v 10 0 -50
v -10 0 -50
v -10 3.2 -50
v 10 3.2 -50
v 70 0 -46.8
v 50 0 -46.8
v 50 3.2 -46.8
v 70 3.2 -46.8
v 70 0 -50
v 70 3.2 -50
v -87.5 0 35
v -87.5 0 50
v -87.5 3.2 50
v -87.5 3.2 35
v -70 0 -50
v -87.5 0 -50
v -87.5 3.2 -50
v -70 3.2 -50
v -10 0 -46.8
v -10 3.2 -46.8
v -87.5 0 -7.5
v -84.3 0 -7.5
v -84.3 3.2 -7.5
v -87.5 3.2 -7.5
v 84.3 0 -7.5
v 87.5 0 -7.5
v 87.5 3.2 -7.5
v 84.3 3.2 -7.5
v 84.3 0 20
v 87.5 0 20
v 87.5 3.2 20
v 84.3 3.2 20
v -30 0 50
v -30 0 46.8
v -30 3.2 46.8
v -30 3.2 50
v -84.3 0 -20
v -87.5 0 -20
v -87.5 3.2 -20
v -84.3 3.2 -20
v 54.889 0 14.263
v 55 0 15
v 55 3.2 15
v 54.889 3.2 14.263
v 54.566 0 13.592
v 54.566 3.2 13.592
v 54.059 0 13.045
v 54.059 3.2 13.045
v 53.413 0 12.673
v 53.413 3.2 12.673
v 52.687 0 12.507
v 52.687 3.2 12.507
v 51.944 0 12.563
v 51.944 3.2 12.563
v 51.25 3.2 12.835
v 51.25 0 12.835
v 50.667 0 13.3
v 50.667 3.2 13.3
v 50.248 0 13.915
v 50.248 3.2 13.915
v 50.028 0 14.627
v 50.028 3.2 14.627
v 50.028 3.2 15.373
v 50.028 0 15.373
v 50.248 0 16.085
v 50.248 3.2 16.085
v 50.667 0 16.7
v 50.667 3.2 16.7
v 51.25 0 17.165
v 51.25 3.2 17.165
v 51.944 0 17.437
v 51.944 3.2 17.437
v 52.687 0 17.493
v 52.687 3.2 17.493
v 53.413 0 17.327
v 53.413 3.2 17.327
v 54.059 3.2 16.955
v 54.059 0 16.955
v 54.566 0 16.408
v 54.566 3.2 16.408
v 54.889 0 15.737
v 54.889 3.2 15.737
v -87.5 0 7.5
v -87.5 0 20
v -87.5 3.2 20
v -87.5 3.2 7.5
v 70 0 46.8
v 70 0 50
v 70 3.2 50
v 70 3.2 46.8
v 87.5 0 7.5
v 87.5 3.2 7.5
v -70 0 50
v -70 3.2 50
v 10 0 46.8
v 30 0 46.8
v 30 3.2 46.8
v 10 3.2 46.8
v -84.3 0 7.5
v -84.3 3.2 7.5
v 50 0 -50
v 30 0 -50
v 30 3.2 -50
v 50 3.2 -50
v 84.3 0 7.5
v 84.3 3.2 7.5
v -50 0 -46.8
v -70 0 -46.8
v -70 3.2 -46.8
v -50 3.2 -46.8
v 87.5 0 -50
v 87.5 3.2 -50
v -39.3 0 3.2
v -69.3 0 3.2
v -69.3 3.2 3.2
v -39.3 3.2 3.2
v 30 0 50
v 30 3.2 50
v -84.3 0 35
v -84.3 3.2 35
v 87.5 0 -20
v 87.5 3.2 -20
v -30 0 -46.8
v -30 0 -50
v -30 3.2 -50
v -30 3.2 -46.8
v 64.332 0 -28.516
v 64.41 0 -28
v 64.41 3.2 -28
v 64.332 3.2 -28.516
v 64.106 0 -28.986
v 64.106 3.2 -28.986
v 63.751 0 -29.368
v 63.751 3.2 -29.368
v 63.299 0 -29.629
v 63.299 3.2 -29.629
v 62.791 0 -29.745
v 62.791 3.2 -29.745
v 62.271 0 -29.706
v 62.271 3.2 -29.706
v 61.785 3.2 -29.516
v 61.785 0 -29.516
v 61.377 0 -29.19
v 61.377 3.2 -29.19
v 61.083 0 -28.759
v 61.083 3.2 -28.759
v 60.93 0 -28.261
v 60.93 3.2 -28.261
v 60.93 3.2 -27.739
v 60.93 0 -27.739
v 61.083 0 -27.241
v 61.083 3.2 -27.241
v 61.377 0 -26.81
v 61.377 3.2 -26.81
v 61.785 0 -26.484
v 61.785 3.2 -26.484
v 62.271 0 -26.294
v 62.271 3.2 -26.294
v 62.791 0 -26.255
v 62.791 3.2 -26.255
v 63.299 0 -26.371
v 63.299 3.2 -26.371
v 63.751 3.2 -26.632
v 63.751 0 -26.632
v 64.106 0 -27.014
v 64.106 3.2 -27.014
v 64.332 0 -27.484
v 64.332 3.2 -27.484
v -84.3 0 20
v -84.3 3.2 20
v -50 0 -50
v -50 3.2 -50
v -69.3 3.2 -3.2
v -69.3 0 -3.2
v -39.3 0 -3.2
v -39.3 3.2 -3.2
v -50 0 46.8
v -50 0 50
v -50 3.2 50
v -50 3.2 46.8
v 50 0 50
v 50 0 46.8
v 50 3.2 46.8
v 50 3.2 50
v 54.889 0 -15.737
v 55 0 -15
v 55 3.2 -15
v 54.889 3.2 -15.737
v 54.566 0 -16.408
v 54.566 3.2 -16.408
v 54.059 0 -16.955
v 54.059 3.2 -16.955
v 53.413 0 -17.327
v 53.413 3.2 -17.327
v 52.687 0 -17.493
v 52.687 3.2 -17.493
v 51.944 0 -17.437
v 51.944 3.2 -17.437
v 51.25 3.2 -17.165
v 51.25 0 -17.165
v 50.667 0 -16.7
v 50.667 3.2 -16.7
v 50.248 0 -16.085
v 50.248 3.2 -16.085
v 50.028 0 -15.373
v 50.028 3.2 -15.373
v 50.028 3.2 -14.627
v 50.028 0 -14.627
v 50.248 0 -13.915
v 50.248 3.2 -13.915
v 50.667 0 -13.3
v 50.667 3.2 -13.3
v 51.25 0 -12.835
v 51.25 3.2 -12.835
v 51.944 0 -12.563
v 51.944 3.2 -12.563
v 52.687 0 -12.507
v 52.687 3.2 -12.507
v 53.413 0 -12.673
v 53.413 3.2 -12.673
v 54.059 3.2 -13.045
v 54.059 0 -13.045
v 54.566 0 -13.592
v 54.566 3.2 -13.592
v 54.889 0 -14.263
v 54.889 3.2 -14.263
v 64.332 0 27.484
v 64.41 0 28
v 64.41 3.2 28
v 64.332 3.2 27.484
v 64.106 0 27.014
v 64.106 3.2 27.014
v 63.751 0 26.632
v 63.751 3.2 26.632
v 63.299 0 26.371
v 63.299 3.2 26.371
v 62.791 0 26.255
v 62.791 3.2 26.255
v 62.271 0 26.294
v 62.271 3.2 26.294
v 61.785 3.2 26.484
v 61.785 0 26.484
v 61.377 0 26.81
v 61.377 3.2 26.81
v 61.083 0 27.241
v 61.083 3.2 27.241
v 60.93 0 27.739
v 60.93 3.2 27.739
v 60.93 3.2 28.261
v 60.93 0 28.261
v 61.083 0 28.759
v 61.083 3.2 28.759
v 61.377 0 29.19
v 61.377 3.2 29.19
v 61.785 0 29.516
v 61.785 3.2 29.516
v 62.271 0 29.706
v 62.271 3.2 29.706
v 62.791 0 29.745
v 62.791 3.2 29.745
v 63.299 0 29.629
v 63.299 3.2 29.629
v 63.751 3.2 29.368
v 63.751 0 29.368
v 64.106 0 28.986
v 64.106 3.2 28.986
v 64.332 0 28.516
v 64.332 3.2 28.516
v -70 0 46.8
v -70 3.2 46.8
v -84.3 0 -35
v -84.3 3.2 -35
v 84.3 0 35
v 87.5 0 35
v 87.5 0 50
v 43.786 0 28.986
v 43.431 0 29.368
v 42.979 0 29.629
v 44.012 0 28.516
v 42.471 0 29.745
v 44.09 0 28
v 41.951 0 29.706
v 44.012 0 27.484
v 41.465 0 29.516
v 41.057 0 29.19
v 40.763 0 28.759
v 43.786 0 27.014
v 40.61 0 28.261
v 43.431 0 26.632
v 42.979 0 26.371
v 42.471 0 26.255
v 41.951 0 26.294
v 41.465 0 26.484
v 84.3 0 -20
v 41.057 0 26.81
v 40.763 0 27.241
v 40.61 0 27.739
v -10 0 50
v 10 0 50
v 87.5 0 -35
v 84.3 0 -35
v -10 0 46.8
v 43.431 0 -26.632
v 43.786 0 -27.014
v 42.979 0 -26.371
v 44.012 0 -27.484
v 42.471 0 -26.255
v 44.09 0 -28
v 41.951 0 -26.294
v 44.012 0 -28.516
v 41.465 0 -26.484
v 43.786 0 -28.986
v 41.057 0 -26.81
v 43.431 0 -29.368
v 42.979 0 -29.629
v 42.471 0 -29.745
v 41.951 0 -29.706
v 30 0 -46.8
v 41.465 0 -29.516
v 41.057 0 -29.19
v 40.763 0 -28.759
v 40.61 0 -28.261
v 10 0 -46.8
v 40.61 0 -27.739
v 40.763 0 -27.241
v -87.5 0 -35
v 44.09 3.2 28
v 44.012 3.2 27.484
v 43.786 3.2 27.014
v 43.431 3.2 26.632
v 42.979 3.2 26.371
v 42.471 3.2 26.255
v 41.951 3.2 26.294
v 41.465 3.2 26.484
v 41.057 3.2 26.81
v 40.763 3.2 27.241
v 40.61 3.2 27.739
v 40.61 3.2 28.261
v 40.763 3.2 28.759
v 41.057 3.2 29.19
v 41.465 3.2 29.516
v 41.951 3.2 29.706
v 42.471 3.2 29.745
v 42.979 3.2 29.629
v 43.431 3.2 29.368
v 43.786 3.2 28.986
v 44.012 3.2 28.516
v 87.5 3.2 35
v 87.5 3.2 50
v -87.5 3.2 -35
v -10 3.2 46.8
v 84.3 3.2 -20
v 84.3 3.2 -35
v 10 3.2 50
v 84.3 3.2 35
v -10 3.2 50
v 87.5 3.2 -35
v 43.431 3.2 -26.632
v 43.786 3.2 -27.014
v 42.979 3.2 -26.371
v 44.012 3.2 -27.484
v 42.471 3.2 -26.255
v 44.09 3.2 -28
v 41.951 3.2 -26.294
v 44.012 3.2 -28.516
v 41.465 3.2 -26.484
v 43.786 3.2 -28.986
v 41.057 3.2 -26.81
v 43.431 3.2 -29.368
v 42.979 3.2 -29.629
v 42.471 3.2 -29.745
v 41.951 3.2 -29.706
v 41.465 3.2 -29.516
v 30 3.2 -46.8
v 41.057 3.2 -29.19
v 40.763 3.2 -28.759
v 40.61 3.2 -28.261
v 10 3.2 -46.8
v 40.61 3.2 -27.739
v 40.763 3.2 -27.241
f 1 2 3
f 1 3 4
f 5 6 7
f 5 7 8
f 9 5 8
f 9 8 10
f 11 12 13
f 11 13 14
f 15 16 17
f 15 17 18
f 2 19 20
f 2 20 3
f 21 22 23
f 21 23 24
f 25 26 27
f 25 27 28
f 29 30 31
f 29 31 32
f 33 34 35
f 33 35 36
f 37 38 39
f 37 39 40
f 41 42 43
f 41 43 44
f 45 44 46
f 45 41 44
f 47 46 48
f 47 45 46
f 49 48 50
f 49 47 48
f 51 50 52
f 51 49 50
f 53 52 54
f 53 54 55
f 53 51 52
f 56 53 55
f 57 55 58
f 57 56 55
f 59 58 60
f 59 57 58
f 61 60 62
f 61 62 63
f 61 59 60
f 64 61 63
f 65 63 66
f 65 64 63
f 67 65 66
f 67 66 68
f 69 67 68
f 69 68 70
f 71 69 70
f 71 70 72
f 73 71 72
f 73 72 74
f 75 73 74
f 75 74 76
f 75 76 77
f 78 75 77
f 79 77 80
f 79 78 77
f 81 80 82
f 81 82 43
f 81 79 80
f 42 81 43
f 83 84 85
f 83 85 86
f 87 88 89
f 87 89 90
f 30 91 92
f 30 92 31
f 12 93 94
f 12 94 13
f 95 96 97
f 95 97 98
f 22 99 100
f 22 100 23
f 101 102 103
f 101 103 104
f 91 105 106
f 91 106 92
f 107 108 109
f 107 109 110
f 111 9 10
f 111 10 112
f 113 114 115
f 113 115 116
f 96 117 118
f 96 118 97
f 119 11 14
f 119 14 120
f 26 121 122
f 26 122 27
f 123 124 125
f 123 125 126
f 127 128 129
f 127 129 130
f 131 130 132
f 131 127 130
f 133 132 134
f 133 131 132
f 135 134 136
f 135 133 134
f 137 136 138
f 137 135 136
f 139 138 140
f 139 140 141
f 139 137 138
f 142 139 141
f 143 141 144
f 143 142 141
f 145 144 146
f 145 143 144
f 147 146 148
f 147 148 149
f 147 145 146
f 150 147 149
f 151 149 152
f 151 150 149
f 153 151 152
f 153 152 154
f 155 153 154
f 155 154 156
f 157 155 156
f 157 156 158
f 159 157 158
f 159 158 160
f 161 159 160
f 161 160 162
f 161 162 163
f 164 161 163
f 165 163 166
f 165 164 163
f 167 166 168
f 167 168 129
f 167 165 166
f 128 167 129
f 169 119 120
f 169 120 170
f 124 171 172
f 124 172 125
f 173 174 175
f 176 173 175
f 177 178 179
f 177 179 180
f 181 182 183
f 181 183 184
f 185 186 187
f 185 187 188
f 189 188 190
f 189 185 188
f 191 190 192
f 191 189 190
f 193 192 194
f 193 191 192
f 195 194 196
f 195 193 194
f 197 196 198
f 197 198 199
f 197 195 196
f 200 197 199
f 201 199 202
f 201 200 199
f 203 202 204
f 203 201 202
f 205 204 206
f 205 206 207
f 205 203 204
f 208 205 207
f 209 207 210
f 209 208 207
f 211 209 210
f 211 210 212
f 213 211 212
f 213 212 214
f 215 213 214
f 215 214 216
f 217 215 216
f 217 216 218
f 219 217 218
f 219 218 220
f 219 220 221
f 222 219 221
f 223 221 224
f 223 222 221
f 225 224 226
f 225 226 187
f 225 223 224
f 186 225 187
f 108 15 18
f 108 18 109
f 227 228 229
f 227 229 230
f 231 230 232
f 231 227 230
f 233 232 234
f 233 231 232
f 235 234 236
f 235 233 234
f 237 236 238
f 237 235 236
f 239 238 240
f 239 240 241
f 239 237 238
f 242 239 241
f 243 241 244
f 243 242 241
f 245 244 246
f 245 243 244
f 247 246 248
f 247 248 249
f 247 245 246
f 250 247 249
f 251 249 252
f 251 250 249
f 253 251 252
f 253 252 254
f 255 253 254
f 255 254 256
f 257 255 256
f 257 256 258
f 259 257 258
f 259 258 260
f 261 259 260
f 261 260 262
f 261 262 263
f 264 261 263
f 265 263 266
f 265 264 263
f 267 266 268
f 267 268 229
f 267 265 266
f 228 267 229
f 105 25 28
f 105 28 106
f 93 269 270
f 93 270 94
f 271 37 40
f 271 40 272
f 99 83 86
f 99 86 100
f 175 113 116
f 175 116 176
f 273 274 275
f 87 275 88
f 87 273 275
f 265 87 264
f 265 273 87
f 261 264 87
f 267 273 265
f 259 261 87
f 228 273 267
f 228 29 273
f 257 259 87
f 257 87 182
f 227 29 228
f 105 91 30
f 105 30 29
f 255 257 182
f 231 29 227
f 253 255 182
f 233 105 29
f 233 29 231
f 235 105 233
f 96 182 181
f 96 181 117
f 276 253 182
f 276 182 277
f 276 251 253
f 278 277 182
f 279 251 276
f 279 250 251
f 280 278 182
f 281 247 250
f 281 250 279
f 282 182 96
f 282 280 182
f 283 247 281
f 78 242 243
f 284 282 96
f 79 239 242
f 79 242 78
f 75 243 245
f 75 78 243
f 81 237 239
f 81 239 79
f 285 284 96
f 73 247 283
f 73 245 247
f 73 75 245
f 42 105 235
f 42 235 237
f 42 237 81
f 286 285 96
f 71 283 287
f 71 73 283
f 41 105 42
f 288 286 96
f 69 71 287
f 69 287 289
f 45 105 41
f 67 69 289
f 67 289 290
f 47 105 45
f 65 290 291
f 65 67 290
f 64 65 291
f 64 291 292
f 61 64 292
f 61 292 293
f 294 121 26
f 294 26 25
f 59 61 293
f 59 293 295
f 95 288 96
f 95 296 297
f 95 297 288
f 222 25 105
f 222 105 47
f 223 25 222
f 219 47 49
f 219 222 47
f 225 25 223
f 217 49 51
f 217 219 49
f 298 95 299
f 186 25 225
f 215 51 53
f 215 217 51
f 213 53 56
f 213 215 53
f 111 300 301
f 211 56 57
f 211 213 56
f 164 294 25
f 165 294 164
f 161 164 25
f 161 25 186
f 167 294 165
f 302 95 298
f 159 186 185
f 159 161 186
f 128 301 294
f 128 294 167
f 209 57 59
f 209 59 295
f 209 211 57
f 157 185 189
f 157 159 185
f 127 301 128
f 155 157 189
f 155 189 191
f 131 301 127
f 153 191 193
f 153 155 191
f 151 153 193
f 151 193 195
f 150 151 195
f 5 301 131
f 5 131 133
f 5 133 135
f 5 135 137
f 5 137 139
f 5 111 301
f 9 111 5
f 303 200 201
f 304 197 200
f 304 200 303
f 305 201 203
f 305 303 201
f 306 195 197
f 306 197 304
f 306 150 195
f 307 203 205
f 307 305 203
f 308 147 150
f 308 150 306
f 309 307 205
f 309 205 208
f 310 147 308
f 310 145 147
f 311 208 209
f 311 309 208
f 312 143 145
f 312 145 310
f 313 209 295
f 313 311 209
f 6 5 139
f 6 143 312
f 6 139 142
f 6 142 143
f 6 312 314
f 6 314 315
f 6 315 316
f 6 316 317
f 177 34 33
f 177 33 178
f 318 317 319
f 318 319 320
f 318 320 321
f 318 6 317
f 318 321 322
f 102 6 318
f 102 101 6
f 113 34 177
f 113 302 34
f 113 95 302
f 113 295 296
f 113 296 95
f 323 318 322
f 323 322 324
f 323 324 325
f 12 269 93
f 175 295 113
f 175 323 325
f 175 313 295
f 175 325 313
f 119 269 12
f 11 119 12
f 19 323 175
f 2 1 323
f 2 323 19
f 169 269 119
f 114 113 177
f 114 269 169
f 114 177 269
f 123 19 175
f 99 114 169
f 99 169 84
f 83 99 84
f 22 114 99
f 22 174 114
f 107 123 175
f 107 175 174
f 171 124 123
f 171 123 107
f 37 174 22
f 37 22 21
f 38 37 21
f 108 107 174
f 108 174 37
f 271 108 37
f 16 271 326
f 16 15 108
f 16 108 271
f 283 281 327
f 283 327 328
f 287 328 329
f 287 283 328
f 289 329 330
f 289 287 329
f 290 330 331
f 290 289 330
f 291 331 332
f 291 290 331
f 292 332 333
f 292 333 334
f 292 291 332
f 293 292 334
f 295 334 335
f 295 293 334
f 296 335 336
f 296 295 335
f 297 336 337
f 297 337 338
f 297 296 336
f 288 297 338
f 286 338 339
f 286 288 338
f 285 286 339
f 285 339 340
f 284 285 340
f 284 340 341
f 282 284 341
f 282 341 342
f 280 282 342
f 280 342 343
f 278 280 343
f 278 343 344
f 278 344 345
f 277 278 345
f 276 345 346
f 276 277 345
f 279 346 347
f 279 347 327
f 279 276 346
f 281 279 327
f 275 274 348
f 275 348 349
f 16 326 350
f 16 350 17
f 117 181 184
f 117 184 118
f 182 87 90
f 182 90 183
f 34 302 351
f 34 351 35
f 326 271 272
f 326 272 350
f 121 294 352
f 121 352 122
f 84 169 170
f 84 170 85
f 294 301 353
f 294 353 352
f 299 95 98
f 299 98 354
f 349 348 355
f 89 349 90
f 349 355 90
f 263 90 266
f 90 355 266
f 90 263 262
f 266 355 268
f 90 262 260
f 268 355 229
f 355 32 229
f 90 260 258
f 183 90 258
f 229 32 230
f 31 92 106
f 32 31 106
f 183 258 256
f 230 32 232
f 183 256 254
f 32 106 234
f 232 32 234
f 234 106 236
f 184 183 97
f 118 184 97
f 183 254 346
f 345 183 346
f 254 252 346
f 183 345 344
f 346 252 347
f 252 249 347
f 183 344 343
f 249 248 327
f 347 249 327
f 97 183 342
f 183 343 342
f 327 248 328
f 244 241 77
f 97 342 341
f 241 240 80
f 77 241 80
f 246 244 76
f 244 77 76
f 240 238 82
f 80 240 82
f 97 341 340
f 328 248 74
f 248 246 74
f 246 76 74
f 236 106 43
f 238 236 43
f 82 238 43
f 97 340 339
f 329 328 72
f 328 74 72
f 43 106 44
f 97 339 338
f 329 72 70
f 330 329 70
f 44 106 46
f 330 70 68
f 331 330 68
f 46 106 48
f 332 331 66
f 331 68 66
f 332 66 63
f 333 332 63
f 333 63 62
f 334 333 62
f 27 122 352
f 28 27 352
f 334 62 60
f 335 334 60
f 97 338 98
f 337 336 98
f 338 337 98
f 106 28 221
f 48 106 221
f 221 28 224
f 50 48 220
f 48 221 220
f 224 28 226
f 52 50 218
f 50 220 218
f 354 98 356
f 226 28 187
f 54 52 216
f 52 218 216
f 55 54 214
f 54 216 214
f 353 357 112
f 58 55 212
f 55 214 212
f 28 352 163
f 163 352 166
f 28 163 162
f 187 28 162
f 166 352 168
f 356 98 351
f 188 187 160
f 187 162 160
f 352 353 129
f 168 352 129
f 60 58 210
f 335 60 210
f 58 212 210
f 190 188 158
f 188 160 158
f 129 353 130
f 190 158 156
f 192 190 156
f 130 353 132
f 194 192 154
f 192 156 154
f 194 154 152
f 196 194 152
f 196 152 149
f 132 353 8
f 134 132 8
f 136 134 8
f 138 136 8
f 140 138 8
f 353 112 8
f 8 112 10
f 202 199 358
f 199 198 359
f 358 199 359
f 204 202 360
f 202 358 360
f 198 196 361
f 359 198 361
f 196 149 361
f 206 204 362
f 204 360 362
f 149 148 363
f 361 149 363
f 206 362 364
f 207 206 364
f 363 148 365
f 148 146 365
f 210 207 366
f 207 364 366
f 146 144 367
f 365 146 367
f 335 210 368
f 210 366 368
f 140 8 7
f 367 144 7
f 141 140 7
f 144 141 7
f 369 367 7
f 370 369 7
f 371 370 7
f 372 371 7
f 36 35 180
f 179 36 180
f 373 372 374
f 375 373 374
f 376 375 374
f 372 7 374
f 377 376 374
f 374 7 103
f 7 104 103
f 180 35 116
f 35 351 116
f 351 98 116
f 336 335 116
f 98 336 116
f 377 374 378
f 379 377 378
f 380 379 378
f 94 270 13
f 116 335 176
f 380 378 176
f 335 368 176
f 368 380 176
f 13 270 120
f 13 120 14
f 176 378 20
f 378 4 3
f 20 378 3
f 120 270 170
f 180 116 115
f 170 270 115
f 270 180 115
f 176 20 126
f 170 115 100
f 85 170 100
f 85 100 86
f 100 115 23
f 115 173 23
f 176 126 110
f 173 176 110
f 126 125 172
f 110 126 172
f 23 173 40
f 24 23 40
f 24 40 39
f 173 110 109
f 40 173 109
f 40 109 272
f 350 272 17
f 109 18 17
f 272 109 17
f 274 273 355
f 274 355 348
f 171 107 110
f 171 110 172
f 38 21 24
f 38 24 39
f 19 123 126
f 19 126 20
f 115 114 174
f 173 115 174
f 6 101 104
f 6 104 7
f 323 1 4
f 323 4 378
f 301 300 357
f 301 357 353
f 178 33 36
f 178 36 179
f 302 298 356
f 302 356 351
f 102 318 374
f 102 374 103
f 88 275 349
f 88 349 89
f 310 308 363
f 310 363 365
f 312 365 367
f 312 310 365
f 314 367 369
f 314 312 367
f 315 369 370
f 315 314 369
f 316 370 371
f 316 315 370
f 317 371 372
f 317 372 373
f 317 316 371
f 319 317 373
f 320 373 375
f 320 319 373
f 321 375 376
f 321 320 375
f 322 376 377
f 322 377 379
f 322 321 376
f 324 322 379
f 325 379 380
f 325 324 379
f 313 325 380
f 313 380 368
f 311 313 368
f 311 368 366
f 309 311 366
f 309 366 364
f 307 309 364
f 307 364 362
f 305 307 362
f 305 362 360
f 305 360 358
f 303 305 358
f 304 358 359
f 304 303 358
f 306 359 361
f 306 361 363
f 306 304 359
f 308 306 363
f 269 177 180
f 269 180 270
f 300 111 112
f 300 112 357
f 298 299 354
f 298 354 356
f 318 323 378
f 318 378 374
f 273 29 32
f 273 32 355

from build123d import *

# Parameters (mm, degrees)
SKETCH1_R           = 2.5
SKETCH1_R_2         = 1.75
SKETCH1_W           = 30
SKETCH1_H           = 6.4
BOSS_EXTRUDE1_DEPTH = 3.2


with BuildPart() as part:
    # Sketch1 → Boss-Extrude1 (new body)
    with BuildSketch(Plane(origin=(0, 0, 0), x_dir=(1, 0, 0), z_dir=(0, 1, 0))):
        Polygon((-87.5, 7.5), (-87.5, 20), (-84.3, 20), (-84.3, 35), (-87.5, 35), (-87.5, 50), (-70, 50), (-70, 46.8), (-50, 46.8), (-50, 50), (-30, 50), (-30, 46.8), (-10, 46.8), (-10, 50), (10, 50), (10, 46.8), (30, 46.8), (30, 50), (50, 50), (50, 46.8), (70, 46.8), (70, 50), (87.5, 50), (87.5, 35), (84.3, 35), (84.3, 20), (87.5, 20), (87.5, 7.5), (84.3, 7.5), (84.3, -7.5), (87.5, -7.5), (87.5, -20), (84.3, -20), (84.3, -35), (87.5, -35), (87.5, -50), (70, -50), (70, -46.8), (50, -46.8), (50, -50), (30, -50), (30, -46.8), (10, -46.8), (10, -50), (-10, -50), (-10, -46.8), (-30, -46.8), (-30, -50), (-50, -50), (-50, -46.8), (-70, -46.8), (-70, -50), (-87.5, -50), (-87.5, -35), (-84.3, -35), (-84.3, -20), (-87.5, -20), (-87.5, -7.5), (-84.3, -7.5), (-84.3, 7.5), align=None)
        with Locations((52.5, 15)):
            Circle(SKETCH1_R, mode=Mode.SUBTRACT)
        with Locations((42.34, 28)):
            Circle(SKETCH1_R_2, mode=Mode.SUBTRACT)
        with Locations((62.66, 28)):
            Circle(SKETCH1_R_2, mode=Mode.SUBTRACT)
        with Locations((62.66, -28)):
            Circle(SKETCH1_R_2, mode=Mode.SUBTRACT)
        with Locations((42.34, -28)):
            Circle(SKETCH1_R_2, mode=Mode.SUBTRACT)
        with Locations((52.5, -15)):
            Circle(SKETCH1_R, mode=Mode.SUBTRACT)
        with Locations((-54.3, 0)):
            Rectangle(SKETCH1_W, SKETCH1_H, mode=Mode.SUBTRACT)
    extrude(amount=BOSS_EXTRUDE1_DEPTH)


solid = part.part
